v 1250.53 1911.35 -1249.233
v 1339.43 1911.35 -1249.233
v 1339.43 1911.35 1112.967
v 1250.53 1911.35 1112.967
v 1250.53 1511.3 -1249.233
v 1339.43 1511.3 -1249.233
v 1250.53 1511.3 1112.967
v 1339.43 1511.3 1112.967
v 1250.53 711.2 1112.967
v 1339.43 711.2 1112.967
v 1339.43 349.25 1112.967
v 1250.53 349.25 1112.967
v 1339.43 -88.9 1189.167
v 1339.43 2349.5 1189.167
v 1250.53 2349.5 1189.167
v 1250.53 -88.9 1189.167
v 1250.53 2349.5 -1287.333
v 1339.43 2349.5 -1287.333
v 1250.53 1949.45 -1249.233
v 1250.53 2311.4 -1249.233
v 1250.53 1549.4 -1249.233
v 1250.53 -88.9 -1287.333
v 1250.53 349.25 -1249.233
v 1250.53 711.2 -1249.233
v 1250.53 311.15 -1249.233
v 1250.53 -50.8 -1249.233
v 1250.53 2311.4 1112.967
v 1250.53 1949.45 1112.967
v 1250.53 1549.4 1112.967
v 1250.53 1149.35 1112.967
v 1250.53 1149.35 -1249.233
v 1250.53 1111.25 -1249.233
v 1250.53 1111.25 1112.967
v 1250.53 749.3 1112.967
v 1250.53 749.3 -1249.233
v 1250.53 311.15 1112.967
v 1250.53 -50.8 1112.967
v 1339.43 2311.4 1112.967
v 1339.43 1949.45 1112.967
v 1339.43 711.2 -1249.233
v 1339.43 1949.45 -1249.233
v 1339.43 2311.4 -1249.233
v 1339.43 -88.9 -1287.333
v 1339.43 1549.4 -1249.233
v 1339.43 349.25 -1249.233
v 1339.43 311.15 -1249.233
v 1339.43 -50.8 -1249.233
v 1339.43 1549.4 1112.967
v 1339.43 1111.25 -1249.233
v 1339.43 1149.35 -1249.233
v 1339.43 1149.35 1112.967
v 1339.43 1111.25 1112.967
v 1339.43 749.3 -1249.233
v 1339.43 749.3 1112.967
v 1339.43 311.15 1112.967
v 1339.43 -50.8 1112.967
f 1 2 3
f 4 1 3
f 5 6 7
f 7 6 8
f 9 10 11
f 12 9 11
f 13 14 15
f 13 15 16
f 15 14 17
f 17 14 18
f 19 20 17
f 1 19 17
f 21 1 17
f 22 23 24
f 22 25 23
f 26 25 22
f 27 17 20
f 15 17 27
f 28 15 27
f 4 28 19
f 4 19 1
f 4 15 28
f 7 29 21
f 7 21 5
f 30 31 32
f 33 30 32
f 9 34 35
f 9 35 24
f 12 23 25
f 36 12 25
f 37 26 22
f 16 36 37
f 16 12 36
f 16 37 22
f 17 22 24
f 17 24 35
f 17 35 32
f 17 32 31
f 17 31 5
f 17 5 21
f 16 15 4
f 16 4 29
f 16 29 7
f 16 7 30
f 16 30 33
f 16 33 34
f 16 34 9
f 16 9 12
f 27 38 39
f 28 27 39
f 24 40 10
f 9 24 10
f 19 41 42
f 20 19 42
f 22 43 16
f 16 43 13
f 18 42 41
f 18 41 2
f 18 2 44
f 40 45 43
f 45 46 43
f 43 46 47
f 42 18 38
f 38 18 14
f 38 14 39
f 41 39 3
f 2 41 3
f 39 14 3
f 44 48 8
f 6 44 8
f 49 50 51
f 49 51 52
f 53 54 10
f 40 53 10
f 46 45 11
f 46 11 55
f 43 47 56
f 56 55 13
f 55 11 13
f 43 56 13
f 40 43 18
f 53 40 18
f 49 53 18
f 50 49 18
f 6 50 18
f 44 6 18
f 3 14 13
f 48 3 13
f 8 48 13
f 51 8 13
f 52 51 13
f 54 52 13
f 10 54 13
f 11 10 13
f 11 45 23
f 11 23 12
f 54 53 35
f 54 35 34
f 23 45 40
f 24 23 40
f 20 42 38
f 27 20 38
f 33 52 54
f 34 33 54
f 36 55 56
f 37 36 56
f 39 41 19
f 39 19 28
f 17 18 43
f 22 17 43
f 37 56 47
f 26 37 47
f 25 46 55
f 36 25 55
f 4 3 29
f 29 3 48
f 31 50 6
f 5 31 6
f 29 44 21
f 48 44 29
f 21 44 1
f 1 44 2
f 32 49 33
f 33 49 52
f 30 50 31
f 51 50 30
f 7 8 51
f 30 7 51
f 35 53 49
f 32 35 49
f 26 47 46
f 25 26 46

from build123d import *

# Parameters (mm, degrees)
F0_W     = 2438.4
F0_H     = 2438.4
F0_W_2   = 38.1
F0_H_2   = 2362.2
F0_H_3   = 38.1
F1_DEPTH = 88.9
F2_ANGLE = 90


with BuildPart() as f1:
    # F0 (on Front) → F1 (new body)
    with BuildSketch(Plane.XZ):
        with Locations((31.3295868914, -68.1334469899)):
            Rectangle(F0_W, F0_H)
        Polygon((-1149.7704131086, -1249.2334469899), (-1149.7704131086, 1112.9665530101), (-787.8204131086, 1112.9665530101), (-749.7204131086, 1112.9665530101), (-387.7704131086, 1112.9665530101), (-349.6704131086, 1112.9665530101), (12.2795868914, 1112.9665530101), (50.3795868914, 1112.9665530101), (412.3295868914, 1112.9665530101), (450.4295868914, 1112.9665530101), (812.3795868914, 1112.9665530101), (850.4795868914, 1112.9665530101), (1164.1096339266, 1112.9665530101), (1212.4295868914, 1112.9665530101), (1212.4295868914, -1249.2334469899), (850.4795868914, -1249.2334469899), (812.3795868914, -1249.2334469899), (450.4295868914, -1249.2334469899), (412.3295868914, -1249.2334469899), (50.3795868914, -1249.2334469899), (12.2795868914, -1249.2334469899), (-349.6704131086, -1249.2334469899), (-387.7704131086, -1249.2334469899), (-749.7204131086, -1249.2334469899), (-787.8204131086, -1249.2334469899), align=None, mode=Mode.SUBTRACT)
        with Locations((831.4295868914, -68.1334469899)):
            Rectangle(F0_W_2, F0_H_2)
        with Locations((431.3795868914, -68.1334469899)):
            Rectangle(F0_W_2, F0_H_2)
        with Locations((31.3295868914, -68.1334469899)):
            Rectangle(F0_W_2, F0_H_2)
        with Locations((-368.7204131086, -68.1334469899)):
            Rectangle(F0_W_2, F0_H_2)
        with Locations((-768.7704131086, -68.1334469899)):
            Rectangle(F0_W_2, F0_H_2)
        with Locations((31.3295868914, 1170.1165530101)):
            Rectangle(F0_W, F0_H_3)
    extrude(amount=F1_DEPTH)


with BuildPart() as f1_1:
    # F2: moved
    add(f1.part.rotate(Axis((1250.5295868914, -88.9, -49.0834469899), (0, 0, -1)), F2_ANGLE))


solid = f1_1.part
